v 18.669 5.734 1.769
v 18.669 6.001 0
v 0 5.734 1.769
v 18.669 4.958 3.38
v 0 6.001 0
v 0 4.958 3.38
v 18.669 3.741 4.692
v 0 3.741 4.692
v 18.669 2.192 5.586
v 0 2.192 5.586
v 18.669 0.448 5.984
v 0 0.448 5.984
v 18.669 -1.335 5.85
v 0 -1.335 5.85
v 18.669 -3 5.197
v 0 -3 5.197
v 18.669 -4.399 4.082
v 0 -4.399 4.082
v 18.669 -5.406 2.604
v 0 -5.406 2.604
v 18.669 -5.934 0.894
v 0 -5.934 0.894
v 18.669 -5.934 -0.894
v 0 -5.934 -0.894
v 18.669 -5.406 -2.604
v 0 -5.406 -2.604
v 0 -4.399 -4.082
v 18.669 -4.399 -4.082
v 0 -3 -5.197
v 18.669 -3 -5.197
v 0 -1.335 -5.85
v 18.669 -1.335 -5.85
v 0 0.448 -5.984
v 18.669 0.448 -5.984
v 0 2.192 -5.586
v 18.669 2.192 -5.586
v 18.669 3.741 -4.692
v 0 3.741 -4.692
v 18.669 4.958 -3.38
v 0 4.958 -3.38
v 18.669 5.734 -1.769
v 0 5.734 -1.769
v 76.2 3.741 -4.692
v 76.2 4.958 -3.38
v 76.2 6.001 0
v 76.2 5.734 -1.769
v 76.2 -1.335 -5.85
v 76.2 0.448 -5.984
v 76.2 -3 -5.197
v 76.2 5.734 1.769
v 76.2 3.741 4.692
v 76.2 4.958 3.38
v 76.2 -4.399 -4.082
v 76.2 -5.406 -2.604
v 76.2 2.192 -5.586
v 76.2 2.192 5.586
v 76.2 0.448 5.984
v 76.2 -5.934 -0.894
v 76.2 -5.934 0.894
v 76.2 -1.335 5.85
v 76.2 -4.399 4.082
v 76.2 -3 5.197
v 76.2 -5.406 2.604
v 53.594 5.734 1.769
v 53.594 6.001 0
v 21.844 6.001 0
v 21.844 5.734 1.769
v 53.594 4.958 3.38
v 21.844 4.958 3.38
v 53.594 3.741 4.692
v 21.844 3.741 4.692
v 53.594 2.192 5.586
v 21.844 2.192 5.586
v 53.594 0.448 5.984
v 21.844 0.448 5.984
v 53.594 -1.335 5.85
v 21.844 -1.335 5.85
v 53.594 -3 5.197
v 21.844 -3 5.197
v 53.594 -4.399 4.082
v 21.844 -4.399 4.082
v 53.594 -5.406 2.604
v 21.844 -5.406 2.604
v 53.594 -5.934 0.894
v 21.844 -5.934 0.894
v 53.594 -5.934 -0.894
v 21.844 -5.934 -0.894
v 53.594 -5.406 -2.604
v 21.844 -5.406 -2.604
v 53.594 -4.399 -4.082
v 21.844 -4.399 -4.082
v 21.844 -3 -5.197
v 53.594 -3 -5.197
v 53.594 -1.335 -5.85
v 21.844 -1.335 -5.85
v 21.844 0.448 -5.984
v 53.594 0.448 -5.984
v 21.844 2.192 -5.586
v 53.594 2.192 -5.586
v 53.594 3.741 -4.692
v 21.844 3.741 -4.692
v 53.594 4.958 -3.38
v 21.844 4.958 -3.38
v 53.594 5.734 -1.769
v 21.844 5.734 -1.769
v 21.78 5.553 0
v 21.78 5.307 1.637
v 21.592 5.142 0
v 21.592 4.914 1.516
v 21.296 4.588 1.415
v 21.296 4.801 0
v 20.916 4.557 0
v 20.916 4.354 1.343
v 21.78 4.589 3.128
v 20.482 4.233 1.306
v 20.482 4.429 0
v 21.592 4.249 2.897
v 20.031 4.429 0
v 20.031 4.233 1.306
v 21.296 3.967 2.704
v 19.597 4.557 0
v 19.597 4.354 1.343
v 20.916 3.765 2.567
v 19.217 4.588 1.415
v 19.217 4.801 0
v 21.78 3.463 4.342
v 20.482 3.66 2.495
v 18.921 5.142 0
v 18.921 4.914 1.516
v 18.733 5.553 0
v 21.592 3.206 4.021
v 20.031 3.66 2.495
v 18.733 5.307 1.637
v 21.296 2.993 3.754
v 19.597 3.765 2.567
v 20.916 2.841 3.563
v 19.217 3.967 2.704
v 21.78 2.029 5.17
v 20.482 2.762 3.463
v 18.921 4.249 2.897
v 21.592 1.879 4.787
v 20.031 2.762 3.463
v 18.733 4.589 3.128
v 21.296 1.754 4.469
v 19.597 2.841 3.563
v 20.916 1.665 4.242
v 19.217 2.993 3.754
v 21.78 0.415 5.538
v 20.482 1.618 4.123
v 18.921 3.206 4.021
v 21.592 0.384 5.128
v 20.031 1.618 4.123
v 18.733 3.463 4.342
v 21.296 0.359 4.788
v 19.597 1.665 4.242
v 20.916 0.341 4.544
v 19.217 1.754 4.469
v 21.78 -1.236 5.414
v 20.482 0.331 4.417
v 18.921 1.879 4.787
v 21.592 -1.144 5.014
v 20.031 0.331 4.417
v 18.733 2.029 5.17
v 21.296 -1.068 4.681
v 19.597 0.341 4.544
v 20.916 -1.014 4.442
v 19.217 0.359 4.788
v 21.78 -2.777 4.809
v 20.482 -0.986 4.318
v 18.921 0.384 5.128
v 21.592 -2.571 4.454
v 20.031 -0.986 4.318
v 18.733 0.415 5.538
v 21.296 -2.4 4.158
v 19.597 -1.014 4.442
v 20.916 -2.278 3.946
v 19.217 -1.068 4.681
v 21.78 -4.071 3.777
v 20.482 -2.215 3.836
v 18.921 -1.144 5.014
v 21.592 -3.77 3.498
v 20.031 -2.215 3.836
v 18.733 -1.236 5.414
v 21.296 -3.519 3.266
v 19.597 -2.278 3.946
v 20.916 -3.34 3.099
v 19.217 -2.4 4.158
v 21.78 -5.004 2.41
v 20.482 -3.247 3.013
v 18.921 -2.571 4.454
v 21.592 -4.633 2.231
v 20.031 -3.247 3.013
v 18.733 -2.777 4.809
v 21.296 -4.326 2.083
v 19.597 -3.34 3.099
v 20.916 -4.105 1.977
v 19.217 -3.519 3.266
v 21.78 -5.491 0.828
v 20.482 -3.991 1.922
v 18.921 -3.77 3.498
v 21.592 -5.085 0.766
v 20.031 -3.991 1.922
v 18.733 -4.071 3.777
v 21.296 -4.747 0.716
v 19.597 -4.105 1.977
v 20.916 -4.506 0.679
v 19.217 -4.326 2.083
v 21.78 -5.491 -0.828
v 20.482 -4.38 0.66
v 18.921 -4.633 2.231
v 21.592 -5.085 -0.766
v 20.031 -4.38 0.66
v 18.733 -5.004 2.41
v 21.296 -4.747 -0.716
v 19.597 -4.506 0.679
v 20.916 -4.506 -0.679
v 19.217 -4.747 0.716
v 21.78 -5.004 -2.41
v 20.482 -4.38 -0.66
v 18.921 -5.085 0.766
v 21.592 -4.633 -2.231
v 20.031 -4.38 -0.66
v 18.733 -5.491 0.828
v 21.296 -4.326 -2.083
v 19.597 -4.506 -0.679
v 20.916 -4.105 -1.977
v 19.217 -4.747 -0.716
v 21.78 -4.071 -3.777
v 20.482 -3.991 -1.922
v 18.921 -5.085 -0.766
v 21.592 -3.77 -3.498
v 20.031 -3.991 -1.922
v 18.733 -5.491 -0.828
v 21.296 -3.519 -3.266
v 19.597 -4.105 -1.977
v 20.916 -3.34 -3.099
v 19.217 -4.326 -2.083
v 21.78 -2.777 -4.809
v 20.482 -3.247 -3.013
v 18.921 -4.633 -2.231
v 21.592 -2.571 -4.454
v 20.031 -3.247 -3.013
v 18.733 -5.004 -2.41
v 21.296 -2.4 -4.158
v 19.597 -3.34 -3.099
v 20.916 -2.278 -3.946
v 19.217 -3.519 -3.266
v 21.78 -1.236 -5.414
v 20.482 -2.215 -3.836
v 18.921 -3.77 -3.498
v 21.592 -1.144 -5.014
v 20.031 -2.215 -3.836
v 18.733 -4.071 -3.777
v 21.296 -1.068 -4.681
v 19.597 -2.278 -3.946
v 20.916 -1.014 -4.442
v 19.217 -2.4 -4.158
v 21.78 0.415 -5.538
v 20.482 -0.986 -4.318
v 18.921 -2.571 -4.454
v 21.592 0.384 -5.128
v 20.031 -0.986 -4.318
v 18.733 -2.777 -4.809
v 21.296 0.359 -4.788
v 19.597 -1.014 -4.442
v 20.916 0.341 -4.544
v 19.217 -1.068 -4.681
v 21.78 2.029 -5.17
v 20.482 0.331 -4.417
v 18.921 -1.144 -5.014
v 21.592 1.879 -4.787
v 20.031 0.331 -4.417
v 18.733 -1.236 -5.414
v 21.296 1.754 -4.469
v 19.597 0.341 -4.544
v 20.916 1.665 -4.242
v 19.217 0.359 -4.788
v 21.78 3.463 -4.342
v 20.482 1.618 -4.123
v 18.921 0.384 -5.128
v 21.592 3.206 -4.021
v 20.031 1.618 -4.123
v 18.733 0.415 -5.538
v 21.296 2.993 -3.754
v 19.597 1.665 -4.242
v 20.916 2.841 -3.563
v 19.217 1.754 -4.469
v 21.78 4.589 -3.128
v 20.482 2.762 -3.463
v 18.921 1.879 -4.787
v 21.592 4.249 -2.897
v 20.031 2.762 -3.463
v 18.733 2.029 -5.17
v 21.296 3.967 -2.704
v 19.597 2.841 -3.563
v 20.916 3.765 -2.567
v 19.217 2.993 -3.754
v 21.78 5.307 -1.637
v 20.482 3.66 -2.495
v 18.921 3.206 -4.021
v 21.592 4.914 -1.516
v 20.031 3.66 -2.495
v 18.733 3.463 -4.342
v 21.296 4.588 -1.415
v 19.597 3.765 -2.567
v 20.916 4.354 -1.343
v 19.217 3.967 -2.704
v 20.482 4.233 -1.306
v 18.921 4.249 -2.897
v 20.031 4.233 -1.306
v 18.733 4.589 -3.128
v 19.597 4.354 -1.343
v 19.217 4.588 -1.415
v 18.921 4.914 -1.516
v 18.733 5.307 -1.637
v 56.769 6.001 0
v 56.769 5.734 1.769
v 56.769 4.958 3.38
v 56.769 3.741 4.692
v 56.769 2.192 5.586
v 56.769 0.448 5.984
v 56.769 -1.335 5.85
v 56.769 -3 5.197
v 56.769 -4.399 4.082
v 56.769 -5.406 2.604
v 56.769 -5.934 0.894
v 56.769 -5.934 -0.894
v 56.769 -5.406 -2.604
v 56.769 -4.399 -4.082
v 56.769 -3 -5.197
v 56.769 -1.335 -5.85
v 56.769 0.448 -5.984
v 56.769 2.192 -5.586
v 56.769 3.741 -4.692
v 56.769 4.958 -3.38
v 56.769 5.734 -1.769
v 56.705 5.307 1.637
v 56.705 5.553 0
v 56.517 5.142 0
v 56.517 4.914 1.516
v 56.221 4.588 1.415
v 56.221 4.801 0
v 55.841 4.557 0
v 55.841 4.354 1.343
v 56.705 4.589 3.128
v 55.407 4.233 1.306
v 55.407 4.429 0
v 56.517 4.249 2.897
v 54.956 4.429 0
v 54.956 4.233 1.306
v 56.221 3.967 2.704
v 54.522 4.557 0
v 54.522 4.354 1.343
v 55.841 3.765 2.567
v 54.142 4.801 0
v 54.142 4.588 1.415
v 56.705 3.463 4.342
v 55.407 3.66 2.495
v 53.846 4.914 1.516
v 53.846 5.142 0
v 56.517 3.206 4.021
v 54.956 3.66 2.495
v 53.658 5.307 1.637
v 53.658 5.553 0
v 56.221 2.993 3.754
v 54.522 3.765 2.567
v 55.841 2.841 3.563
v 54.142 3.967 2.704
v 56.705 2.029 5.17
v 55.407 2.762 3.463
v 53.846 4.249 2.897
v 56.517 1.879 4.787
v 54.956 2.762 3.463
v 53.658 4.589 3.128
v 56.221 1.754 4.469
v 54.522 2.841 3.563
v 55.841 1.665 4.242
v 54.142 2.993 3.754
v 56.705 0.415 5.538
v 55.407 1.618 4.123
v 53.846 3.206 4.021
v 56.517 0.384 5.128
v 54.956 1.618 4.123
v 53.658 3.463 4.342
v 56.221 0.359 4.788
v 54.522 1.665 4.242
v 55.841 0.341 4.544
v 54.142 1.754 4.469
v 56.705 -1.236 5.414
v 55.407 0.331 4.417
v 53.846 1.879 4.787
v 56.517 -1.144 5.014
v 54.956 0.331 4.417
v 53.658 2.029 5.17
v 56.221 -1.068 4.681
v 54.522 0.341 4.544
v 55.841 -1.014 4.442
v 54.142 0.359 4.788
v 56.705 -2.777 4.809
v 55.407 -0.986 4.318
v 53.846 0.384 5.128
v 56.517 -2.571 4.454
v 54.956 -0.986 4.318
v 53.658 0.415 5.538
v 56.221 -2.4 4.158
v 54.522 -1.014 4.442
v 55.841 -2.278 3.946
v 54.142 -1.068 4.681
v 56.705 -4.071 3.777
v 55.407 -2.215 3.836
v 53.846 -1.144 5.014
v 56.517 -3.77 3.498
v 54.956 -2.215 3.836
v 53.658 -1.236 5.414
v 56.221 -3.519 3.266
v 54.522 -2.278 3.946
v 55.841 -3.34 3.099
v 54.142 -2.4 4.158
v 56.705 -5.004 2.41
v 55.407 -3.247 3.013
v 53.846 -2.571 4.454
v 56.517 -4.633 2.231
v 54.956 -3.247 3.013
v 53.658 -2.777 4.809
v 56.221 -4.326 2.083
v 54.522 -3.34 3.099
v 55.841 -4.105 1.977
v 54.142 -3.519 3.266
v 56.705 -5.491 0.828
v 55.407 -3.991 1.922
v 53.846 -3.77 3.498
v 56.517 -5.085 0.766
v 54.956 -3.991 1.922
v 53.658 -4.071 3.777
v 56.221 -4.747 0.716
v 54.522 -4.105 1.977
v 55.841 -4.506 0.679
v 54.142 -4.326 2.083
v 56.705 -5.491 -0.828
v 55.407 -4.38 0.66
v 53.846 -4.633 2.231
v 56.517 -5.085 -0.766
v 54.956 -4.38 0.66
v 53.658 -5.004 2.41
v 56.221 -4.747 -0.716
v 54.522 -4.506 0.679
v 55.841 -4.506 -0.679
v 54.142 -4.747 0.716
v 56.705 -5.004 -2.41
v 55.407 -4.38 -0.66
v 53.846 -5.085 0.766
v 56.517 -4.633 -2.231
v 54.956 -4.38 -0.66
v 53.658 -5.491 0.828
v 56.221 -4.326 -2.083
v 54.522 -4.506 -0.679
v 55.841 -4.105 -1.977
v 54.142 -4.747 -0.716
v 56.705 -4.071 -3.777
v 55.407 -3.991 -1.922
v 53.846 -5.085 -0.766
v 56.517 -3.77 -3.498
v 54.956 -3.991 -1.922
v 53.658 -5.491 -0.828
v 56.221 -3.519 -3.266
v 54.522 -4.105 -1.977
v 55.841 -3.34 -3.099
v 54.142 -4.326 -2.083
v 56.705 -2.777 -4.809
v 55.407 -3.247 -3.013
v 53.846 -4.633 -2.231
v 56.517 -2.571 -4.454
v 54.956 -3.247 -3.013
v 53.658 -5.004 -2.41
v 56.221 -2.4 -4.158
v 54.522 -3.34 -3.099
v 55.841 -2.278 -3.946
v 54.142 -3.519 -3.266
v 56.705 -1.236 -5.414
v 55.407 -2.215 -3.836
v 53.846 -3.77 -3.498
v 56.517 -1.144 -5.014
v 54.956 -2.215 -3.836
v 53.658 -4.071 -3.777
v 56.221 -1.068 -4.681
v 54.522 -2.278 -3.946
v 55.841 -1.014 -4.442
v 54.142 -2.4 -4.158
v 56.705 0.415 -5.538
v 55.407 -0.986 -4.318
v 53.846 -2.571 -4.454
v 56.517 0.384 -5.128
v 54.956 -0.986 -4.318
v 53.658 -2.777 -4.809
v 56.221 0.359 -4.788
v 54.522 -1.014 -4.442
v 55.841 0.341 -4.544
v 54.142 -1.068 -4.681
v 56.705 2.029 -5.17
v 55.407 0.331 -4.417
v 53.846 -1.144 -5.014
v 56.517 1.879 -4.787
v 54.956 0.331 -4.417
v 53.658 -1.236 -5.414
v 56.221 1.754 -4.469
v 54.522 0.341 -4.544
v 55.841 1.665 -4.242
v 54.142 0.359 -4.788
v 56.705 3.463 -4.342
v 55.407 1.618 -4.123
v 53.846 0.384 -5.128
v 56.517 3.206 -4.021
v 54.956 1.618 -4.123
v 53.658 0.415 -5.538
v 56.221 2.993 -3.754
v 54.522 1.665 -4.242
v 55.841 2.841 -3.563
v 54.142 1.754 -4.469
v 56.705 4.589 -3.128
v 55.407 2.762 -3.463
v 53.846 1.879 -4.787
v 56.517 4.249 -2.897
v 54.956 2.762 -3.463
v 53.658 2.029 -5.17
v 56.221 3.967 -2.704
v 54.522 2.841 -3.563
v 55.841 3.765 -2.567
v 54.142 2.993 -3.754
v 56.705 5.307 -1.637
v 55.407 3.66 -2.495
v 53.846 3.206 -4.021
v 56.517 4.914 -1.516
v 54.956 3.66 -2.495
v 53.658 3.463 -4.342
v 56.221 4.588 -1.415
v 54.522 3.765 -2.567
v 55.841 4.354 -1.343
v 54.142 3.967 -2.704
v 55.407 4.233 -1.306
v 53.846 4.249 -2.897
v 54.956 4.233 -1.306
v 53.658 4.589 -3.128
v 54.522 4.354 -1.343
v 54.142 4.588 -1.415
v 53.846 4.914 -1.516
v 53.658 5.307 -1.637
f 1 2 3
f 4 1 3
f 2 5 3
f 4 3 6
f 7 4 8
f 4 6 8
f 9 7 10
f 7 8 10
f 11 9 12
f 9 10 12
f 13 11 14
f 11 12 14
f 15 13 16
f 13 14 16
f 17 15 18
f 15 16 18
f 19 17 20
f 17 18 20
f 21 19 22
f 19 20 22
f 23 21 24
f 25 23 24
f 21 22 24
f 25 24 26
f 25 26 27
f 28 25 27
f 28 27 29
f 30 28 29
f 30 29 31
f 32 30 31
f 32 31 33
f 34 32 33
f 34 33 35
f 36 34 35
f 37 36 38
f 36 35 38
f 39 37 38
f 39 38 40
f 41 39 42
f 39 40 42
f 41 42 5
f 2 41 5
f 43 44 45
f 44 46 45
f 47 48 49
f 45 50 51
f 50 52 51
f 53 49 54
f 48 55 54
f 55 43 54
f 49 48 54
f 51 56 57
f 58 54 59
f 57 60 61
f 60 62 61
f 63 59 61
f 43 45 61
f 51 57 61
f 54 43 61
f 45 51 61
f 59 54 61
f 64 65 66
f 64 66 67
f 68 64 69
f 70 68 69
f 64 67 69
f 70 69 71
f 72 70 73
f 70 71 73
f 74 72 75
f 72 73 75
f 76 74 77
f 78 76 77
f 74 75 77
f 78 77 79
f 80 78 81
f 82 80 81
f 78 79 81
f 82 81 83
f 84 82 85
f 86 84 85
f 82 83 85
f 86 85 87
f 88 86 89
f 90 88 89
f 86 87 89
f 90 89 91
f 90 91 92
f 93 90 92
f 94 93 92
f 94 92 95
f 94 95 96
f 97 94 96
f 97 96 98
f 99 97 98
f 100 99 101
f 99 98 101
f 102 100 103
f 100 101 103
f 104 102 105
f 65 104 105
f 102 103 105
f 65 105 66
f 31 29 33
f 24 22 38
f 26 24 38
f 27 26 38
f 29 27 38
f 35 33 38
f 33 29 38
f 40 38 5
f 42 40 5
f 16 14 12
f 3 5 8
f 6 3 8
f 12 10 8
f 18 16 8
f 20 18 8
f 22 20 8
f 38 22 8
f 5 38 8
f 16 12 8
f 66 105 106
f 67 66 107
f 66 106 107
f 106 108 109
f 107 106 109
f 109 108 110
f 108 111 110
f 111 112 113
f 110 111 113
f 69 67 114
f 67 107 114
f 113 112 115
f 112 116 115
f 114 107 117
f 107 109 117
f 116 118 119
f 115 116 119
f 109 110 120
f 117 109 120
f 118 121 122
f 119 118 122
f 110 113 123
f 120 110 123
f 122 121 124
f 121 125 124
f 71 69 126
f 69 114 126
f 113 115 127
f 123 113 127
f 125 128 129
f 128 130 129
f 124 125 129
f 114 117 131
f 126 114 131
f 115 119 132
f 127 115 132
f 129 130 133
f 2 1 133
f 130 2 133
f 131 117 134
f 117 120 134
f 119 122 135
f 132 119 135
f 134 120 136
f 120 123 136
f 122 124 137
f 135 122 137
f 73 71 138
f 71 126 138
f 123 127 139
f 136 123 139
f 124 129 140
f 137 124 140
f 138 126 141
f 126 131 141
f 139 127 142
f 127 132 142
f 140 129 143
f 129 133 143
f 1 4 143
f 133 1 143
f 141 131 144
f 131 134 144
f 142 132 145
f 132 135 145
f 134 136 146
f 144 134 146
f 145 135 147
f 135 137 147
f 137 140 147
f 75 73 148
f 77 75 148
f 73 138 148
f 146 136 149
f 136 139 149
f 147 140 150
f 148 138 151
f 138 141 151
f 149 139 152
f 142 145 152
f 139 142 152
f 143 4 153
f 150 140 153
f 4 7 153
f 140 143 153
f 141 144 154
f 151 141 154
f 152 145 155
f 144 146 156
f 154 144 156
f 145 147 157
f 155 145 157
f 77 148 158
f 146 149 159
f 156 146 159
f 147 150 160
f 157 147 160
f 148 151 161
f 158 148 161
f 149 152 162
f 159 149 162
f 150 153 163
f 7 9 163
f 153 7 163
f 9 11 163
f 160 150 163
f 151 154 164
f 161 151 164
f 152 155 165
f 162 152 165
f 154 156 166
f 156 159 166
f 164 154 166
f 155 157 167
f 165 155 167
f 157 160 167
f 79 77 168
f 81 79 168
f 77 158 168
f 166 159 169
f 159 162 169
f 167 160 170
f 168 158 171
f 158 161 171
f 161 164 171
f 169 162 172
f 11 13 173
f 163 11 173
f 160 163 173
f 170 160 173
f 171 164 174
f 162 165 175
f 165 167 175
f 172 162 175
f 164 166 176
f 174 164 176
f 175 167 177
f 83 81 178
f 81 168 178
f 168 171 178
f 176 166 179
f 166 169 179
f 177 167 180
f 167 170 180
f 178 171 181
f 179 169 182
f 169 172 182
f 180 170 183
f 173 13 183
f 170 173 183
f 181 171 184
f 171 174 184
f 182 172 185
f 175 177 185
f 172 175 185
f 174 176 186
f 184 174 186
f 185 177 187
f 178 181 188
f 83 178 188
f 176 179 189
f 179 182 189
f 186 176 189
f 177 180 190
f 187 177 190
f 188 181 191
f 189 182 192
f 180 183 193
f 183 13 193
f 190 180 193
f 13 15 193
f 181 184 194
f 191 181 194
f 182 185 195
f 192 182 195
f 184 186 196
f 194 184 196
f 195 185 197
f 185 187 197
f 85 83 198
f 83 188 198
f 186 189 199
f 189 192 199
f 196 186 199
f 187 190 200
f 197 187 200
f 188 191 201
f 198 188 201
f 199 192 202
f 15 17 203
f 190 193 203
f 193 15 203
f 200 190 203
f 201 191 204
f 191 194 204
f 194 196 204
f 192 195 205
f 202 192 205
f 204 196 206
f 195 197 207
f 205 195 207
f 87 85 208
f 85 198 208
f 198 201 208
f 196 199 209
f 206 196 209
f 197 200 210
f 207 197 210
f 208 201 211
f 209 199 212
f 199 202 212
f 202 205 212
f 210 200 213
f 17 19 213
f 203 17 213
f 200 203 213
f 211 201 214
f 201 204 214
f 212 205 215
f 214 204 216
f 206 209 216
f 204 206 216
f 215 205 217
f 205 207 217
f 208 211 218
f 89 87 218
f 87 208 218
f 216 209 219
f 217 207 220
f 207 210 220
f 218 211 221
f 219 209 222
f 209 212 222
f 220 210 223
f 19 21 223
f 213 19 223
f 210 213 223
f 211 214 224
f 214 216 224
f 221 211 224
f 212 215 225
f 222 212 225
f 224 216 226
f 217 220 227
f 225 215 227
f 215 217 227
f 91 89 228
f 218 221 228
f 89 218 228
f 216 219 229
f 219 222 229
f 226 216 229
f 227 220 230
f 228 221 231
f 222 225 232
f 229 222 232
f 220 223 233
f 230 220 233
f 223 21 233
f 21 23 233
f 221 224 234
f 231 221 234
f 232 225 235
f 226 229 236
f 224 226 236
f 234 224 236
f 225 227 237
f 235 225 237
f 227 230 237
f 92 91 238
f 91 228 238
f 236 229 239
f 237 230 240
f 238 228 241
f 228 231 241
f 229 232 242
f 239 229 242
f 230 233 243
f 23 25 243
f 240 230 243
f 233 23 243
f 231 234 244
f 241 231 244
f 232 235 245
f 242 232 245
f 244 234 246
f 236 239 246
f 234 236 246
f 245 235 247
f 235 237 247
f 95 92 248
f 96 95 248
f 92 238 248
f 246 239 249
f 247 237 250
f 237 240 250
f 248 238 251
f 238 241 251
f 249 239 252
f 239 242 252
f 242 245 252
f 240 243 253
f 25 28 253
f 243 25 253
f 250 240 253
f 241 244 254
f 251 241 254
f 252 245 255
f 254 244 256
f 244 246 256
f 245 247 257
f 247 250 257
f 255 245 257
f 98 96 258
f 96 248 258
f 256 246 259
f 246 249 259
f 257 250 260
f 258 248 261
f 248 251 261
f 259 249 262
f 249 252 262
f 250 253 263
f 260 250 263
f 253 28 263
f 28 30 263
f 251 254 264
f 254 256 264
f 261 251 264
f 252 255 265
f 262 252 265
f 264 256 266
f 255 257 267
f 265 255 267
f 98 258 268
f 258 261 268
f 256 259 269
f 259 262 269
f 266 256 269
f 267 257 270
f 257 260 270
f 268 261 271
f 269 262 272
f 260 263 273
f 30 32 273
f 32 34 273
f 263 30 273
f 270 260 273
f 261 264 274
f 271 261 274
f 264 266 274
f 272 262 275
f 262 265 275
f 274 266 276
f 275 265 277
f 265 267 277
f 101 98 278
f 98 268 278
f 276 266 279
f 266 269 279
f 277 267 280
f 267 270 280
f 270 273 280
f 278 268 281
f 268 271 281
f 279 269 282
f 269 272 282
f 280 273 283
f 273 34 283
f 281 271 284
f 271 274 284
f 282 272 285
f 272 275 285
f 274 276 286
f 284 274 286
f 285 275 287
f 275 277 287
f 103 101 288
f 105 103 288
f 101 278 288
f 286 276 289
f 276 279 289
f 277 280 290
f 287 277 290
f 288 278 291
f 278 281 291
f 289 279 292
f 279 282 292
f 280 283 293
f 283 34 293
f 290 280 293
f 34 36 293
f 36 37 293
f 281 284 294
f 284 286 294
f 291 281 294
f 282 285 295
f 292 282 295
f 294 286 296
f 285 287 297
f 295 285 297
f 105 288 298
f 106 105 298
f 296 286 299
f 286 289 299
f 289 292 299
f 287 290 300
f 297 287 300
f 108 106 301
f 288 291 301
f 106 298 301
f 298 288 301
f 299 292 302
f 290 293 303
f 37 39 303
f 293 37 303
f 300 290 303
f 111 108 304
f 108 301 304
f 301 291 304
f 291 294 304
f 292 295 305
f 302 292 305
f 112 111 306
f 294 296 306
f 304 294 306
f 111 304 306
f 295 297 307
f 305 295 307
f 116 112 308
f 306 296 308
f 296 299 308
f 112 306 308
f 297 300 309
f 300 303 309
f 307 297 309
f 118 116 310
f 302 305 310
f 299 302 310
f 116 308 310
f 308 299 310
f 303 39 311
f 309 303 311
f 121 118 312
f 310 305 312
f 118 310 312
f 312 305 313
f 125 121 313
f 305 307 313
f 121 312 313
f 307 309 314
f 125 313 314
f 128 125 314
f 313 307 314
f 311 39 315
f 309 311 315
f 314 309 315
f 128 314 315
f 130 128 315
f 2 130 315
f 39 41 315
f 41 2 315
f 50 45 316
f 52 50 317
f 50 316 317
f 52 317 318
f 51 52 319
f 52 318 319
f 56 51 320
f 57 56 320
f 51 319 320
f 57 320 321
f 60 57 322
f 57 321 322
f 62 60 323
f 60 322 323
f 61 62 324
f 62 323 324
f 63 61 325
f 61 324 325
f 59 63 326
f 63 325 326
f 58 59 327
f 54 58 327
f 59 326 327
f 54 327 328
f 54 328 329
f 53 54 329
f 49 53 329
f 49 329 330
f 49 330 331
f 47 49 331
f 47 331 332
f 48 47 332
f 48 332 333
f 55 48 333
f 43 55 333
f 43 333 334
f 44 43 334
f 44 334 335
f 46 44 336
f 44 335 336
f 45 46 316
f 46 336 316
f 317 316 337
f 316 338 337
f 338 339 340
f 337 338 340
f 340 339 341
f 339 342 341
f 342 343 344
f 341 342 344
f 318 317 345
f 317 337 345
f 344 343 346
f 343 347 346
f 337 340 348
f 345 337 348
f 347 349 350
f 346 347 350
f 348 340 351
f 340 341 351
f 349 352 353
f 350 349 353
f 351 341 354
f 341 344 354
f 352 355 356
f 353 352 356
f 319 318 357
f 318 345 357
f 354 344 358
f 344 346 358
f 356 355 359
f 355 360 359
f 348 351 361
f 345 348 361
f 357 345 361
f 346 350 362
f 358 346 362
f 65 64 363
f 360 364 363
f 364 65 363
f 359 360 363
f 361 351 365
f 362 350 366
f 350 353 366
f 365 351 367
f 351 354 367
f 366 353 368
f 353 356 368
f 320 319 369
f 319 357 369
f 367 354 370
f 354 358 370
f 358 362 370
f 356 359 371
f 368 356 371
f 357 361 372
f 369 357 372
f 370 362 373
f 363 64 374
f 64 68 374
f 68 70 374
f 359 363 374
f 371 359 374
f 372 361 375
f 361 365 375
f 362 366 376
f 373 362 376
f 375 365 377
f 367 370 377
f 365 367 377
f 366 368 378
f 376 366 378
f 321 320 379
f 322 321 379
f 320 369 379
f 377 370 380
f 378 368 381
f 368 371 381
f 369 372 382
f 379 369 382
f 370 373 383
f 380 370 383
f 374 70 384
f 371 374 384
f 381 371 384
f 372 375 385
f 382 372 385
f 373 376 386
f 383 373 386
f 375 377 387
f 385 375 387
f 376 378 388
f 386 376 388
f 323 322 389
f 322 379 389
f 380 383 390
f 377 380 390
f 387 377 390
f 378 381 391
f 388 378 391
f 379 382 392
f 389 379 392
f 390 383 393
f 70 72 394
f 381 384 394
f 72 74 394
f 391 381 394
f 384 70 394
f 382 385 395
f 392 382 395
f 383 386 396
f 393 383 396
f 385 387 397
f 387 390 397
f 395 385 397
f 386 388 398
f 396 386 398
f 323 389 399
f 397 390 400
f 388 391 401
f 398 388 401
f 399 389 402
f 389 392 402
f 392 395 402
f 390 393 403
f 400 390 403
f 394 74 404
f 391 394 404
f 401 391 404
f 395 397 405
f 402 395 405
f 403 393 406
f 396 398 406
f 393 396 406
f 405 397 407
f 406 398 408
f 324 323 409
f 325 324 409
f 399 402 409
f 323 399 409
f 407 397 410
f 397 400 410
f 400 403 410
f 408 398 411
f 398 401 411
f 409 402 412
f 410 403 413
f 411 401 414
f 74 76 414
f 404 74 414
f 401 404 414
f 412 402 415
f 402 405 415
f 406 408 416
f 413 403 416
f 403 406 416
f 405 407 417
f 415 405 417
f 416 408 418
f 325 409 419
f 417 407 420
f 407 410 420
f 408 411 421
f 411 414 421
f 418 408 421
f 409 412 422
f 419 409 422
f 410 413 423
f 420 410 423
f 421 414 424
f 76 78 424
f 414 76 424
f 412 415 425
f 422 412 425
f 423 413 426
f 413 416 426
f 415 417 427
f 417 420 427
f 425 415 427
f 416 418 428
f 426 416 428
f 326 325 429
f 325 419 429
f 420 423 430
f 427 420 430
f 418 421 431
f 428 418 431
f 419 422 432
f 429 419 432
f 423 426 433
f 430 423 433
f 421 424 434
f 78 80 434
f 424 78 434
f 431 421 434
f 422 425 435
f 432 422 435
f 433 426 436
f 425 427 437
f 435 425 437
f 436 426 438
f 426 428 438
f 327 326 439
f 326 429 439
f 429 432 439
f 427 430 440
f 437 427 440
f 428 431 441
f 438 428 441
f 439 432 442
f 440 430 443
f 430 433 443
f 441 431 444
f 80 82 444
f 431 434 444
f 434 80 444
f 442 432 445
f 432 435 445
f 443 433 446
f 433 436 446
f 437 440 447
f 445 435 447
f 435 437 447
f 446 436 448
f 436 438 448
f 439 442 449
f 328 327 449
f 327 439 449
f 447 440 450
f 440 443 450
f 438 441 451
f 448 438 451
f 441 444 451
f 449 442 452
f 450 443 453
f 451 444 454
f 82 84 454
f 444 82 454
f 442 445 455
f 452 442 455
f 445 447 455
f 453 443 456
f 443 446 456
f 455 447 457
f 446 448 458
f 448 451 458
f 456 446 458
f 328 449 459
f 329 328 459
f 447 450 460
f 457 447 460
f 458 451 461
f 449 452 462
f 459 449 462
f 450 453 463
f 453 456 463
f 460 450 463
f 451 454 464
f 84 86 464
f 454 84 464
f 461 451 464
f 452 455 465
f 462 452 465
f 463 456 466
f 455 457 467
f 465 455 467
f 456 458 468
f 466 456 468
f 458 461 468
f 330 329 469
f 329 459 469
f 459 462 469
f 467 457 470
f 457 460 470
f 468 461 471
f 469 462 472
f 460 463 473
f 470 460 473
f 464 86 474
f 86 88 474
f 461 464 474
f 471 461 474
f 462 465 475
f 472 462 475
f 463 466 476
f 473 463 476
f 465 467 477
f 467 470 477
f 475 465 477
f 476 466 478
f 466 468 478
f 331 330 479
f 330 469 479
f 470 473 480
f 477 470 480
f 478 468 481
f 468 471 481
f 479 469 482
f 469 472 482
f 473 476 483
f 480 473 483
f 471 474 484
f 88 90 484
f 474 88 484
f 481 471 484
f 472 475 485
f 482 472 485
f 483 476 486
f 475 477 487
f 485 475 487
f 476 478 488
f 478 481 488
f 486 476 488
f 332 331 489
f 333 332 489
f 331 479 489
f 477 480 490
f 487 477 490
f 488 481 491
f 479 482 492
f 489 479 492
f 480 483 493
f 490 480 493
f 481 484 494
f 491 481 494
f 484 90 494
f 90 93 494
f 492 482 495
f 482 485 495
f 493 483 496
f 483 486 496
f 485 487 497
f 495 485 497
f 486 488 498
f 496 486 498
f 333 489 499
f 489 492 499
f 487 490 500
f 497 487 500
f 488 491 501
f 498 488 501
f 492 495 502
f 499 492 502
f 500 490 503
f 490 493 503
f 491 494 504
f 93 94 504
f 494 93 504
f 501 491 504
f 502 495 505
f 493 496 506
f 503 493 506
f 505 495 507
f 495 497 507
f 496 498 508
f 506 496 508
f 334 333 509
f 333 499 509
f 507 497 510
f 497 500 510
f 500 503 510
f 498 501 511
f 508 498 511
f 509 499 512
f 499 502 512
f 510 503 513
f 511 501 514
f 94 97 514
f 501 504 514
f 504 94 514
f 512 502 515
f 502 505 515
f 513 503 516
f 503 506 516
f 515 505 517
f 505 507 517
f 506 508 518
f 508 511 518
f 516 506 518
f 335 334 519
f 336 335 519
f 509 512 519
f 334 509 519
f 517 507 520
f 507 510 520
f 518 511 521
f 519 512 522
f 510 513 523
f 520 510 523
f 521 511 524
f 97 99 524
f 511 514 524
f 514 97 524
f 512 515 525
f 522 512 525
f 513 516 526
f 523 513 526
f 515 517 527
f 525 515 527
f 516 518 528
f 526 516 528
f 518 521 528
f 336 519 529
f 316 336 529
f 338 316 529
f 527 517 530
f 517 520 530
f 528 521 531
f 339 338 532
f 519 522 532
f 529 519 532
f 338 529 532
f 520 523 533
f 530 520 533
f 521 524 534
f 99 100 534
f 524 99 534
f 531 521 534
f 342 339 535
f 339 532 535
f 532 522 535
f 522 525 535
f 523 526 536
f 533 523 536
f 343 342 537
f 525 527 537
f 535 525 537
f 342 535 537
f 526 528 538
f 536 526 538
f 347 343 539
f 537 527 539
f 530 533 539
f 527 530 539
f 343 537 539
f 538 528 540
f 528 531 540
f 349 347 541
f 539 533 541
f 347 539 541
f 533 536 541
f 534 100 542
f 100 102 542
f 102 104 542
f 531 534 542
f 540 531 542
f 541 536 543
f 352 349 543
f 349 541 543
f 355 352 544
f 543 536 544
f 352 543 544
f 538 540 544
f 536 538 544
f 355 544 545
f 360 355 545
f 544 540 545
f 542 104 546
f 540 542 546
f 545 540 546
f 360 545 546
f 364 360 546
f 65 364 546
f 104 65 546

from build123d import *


with BuildPart() as f1:
    # F0 (on Top) → F1 (revolve)
    with BuildSketch(Plane.XY):
        with BuildLine():
            Line((0, 6.00075), (0, 0))
            Line((0, 0), (76.2, 0))
            Line((76.2, 0), (76.2, 6.00075))
            Line((76.2, 6.00075), (56.769, 6.00075))
            ThreePointArc((56.769, 6.00075), (55.1815, 4.41325), (53.594, 6.00075))
            Line((53.594, 6.00075), (21.844, 6.00075))
            ThreePointArc((21.844, 6.00075), (20.2565, 4.41325), (18.669, 6.00075))
            Line((18.669, 6.00075), (0, 6.00075))
        make_face()
    revolve(axis=Axis((38.1, 0, 0), (1, 0, 0)))


solid = f1.part
